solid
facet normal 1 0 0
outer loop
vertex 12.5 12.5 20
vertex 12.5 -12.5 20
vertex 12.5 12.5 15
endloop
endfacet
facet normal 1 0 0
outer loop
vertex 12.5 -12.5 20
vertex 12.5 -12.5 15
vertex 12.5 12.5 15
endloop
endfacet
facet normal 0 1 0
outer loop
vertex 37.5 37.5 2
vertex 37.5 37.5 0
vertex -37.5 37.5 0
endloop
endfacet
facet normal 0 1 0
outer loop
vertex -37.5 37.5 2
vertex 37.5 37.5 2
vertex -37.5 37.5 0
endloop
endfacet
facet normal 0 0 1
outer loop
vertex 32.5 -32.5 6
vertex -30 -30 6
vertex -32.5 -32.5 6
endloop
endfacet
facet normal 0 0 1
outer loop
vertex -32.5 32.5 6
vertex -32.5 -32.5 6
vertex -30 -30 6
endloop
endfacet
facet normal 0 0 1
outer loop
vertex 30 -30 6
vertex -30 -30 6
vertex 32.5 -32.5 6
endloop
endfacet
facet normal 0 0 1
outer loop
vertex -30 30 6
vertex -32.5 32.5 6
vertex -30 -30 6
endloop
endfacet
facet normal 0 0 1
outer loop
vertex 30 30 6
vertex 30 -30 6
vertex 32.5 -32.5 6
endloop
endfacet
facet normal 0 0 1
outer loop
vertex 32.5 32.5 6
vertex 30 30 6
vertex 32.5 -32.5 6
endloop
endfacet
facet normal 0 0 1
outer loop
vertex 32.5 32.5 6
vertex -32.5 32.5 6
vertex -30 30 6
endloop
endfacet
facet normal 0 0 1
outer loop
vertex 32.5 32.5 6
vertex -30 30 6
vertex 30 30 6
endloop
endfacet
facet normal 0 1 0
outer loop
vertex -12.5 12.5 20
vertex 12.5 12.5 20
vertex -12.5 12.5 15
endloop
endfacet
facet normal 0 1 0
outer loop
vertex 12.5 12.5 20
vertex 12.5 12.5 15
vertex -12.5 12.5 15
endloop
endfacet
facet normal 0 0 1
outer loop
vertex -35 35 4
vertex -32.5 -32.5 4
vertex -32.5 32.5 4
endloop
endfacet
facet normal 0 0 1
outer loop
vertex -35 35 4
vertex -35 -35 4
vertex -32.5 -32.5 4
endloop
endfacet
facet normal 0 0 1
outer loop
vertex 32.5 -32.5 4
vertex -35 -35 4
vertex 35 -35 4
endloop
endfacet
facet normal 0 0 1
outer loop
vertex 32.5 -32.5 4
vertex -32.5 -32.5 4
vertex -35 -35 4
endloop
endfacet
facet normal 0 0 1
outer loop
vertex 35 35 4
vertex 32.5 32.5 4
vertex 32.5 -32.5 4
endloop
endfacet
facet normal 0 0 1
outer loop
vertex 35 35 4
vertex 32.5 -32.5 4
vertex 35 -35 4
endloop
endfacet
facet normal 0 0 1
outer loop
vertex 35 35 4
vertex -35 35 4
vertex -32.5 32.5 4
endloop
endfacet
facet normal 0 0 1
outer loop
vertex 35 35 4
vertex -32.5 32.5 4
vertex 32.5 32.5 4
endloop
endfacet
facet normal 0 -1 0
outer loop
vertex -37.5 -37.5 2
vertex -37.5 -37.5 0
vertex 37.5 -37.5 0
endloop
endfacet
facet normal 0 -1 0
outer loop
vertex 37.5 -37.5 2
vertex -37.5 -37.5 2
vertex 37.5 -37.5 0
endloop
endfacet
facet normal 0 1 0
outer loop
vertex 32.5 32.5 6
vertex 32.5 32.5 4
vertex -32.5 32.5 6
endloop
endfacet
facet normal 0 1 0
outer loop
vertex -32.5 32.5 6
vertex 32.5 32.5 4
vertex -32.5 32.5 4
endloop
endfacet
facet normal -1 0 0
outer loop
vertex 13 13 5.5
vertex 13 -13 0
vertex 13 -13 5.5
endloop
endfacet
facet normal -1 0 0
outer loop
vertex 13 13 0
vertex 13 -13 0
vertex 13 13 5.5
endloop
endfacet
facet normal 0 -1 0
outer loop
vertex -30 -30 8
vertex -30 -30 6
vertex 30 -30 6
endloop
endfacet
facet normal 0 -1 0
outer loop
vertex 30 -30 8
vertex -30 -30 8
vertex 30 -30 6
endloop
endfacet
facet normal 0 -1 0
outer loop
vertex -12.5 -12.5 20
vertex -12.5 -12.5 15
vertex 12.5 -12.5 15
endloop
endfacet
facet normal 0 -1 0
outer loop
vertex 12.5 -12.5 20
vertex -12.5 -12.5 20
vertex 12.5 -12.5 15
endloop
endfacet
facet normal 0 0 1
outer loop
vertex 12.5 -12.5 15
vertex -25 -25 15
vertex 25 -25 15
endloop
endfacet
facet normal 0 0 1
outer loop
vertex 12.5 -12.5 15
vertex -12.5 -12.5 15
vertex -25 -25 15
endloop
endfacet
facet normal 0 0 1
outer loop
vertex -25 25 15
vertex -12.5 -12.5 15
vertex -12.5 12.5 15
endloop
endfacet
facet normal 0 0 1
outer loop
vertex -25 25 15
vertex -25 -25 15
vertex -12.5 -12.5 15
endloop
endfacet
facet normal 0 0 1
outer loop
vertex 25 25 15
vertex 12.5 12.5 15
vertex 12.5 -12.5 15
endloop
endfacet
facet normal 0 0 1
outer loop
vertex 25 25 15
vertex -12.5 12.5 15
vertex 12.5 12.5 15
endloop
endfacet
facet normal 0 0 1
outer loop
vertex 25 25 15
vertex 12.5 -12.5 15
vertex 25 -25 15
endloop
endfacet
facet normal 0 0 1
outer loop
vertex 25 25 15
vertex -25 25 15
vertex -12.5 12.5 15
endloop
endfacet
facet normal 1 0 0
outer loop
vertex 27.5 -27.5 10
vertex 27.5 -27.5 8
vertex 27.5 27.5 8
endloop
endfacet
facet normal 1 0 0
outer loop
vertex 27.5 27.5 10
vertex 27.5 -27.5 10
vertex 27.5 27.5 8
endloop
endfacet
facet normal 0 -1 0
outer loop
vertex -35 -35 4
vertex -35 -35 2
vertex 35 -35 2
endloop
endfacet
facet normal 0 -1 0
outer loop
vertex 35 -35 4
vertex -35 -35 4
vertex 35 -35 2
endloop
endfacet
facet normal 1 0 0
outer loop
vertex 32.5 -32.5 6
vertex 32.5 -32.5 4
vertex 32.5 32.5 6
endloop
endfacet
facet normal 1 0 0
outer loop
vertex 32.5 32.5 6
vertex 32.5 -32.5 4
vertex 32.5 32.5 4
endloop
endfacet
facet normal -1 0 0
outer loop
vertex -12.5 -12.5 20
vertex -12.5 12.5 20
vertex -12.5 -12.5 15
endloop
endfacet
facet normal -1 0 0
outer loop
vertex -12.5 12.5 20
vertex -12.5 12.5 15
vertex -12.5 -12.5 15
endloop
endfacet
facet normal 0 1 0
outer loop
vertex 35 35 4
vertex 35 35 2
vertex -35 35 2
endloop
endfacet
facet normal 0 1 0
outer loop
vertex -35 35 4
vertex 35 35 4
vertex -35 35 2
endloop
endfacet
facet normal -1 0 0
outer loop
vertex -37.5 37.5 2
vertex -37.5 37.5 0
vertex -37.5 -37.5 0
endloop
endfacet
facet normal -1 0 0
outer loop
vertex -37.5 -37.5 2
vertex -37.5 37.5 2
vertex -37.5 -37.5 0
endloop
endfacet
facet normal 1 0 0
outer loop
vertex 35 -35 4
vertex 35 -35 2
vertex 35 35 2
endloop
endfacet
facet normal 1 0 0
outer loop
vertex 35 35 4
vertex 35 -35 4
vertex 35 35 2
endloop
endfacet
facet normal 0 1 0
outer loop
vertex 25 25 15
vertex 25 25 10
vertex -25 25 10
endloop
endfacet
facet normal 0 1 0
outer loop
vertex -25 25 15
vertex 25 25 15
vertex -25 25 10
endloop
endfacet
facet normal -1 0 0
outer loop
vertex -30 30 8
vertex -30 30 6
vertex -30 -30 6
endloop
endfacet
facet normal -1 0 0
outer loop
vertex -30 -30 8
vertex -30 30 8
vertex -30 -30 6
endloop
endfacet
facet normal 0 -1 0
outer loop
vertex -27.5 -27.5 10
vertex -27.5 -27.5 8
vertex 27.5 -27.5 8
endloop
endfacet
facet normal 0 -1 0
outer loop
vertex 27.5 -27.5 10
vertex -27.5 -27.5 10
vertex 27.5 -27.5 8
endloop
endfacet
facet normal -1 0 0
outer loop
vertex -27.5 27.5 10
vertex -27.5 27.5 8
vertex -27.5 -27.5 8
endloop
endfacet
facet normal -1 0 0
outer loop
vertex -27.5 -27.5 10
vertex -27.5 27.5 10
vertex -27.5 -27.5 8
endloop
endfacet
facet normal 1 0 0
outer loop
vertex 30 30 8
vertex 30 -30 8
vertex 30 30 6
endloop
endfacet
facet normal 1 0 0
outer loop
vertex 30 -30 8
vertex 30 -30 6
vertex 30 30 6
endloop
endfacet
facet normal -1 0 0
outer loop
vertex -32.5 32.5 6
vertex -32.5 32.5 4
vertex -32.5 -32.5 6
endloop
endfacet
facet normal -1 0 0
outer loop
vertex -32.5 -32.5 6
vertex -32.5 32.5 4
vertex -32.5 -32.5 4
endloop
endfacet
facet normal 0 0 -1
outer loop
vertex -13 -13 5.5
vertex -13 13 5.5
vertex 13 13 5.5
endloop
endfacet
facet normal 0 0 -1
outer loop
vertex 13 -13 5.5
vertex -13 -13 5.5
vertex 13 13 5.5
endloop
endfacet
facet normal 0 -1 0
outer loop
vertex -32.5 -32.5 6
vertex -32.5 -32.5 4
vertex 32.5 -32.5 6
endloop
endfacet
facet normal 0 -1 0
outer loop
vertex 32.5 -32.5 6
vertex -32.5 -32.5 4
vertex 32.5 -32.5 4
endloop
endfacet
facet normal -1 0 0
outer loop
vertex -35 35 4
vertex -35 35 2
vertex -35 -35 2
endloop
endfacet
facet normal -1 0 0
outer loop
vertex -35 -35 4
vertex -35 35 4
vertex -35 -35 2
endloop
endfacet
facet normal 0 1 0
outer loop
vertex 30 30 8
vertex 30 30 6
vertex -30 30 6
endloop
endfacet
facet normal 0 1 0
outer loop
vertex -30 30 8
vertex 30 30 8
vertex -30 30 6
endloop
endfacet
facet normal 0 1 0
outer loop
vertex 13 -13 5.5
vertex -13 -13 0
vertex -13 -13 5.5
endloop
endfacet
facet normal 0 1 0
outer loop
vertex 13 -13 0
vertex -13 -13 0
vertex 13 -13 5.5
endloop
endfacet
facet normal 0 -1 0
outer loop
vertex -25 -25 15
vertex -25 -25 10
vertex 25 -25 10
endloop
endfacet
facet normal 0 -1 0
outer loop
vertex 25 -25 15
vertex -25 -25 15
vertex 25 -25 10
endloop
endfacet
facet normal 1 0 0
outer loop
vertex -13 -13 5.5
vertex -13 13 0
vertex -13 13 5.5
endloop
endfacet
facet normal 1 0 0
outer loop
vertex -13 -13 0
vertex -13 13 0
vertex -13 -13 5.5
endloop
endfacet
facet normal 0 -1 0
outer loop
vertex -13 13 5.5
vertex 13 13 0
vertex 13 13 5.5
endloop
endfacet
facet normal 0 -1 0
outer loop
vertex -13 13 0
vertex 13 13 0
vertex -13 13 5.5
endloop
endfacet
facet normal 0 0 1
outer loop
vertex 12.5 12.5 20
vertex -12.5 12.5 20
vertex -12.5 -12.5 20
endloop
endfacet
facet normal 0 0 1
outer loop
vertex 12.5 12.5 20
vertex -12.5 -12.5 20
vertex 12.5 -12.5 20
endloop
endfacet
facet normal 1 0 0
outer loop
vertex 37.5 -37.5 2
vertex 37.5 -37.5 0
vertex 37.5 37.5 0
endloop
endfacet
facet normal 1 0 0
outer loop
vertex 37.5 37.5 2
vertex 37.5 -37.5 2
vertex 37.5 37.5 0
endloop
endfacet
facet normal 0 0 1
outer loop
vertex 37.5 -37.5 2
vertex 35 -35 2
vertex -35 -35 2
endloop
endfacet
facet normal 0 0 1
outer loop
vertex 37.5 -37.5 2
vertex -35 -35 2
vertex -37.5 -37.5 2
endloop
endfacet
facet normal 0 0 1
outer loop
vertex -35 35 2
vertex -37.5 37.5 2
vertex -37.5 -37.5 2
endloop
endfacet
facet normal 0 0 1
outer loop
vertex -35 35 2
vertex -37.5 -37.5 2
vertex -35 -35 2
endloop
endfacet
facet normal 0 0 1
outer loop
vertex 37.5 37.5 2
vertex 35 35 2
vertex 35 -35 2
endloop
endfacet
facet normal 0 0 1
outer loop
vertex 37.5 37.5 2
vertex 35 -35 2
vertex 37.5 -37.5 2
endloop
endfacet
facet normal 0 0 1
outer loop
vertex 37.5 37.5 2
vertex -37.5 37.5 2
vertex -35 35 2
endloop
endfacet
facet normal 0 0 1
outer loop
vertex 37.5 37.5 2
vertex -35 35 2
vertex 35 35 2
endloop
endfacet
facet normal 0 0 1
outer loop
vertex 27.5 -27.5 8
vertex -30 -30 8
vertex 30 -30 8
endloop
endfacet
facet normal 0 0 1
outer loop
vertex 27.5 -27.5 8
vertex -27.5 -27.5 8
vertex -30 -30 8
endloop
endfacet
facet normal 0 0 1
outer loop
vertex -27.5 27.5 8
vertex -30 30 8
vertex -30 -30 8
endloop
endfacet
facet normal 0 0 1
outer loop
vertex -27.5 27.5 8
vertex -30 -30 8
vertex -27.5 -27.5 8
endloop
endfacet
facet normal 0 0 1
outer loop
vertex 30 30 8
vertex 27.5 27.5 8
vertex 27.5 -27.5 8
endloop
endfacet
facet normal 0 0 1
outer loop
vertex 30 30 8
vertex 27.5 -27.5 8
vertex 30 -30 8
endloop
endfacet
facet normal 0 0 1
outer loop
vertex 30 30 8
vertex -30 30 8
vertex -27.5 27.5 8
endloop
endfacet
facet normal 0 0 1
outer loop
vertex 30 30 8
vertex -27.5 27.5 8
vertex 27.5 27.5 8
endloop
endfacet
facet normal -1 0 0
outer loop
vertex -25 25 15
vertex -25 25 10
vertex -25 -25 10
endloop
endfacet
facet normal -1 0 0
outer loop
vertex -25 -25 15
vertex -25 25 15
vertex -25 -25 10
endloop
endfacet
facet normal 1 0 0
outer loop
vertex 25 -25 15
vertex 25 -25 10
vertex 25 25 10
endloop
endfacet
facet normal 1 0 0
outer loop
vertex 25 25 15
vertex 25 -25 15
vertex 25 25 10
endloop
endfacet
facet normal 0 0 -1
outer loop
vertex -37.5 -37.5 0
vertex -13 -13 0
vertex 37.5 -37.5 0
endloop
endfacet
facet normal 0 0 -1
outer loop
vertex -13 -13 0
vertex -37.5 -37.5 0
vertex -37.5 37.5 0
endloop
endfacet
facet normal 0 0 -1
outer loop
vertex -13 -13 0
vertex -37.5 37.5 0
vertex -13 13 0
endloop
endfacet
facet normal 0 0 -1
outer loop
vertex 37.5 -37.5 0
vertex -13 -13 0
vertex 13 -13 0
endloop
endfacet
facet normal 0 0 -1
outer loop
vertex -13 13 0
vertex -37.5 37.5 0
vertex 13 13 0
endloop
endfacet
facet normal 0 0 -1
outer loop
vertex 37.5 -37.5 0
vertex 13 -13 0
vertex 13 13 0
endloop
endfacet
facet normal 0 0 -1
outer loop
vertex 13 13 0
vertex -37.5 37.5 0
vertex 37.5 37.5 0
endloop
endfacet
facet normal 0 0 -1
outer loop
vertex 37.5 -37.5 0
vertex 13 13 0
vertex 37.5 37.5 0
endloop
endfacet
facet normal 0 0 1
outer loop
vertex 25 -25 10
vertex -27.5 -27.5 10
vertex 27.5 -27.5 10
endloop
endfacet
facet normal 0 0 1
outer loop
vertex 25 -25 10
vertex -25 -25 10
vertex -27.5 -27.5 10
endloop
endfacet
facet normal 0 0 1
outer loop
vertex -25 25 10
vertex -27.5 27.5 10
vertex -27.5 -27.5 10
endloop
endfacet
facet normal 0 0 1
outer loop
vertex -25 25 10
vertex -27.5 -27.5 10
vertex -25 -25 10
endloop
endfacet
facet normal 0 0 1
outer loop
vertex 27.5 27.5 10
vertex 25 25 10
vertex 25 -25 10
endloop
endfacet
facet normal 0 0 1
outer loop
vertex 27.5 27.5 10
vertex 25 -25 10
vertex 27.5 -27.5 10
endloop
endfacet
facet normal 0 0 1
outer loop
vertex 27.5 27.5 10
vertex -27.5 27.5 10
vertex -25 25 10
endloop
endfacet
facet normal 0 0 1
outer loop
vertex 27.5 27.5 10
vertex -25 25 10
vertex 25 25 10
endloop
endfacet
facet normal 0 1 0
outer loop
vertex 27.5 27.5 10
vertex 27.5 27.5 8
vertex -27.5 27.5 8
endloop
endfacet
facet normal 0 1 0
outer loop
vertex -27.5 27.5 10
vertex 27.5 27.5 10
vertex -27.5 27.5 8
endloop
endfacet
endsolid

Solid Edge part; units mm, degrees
sketch "Sketch1" plane through (0, 0, 0) normal (0, 0, 1) x (1, 0, 0)
  line L0 (-37.5, -37.5) -> (37.5, -37.5)
  line L1 (37.5, -37.5) -> (37.5, 37.5)
  line L2 (37.5, 37.5) -> (-37.5, 37.5)
  line L3 (-37.5, 37.5) -> (-37.5, -37.5)
extrude "Protrusion1" add sketch "Sketch1" along normal blind 2
sketch "Sketch2" plane through (0, 0, 0) normal (0, 0, 1) x (1, 0, 0)
  line L0 (-35, -35) -> (35, -35)
  line L1 (35, -35) -> (35, 35)
  line L2 (35, 35) -> (-35, 35)
  line L3 (-35, 35) -> (-35, -35)
extrude "ExtrudedProtrusion_2" add sketch "Sketch2" along normal blind 4
sketch "Sketch3" plane through (0, 0, 0) normal (0, 0, 1) x (1, 0, 0)
  line L0 (-32.5, -32.5) -> (32.5, -32.5)
  line L1 (32.5, -32.5) -> (32.5, 32.5)
  line L2 (32.5, 32.5) -> (-32.5, 32.5)
  line L3 (-32.5, 32.5) -> (-32.5, -32.5)
extrude "ExtrudedProtrusion_3" add sketch "Sketch3" along normal blind 6
sketch "Sketch4" plane through (0, 0, 0) normal (0, 0, 1) x (1, 0, 0)
  line L0 (-30, -30) -> (30, -30)
  line L1 (30, -30) -> (30, 30)
  line L2 (30, 30) -> (-30, 30)
  line L3 (-30, 30) -> (-30, -30)
extrude "ExtrudedProtrusion_4" add sketch "Sketch4" along normal blind 8
sketch "Sketch5" plane through (0, 0, 0) normal (0, 0, 1) x (1, 0, 0)
  line L0 (-27.5, -27.5) -> (27.5, -27.5)
  line L1 (27.5, -27.5) -> (27.5, 27.5)
  line L2 (27.5, 27.5) -> (-27.5, 27.5)
  line L3 (-27.5, 27.5) -> (-27.5, -27.5)
extrude "ExtrudedProtrusion_5" add sketch "Sketch5" along normal blind 10
sketch "Sketch6" plane through (0, 0, 0) normal (0, 0, 1) x (1, 0, 0)
  line L0 (-25, 25) -> (-25, -25)
  line L1 (-25, -25) -> (25, -25)
  line L2 (25, -25) -> (25, 25)
  line L3 (25, 25) -> (-25, 25)
extrude "ExtrudedProtrusion_6" add sketch "Sketch6" along normal blind 15
sketch "Sketch7" plane through (0, 0, 0) normal (0, 0, 1) x (1, 0, 0)
  line L0 (13, 13) -> (-13, 13)
  line L1 (-13, 13) -> (-13, -13)
  line L2 (-13, -13) -> (13, -13)
  line L3 (13, -13) -> (13, 13)
extrude "ExtrudedCutout_1" cut sketch "Sketch7" along normal blind 5.5
sketch "Sketch8" plane through (0, 0, 15) normal (0, 0, 1) x (0, -1, 0)
  line L0 (-12.5, -12.5) -> (12.5, -12.5)
  line L1 (12.5, -12.5) -> (12.5, 12.5)
  line L2 (12.5, 12.5) -> (-12.5, 12.5)
  line L3 (-12.5, 12.5) -> (-12.5, -12.5)
extrude "ExtrudedProtrusion_8" add sketch "Sketch8" along normal blind 5
